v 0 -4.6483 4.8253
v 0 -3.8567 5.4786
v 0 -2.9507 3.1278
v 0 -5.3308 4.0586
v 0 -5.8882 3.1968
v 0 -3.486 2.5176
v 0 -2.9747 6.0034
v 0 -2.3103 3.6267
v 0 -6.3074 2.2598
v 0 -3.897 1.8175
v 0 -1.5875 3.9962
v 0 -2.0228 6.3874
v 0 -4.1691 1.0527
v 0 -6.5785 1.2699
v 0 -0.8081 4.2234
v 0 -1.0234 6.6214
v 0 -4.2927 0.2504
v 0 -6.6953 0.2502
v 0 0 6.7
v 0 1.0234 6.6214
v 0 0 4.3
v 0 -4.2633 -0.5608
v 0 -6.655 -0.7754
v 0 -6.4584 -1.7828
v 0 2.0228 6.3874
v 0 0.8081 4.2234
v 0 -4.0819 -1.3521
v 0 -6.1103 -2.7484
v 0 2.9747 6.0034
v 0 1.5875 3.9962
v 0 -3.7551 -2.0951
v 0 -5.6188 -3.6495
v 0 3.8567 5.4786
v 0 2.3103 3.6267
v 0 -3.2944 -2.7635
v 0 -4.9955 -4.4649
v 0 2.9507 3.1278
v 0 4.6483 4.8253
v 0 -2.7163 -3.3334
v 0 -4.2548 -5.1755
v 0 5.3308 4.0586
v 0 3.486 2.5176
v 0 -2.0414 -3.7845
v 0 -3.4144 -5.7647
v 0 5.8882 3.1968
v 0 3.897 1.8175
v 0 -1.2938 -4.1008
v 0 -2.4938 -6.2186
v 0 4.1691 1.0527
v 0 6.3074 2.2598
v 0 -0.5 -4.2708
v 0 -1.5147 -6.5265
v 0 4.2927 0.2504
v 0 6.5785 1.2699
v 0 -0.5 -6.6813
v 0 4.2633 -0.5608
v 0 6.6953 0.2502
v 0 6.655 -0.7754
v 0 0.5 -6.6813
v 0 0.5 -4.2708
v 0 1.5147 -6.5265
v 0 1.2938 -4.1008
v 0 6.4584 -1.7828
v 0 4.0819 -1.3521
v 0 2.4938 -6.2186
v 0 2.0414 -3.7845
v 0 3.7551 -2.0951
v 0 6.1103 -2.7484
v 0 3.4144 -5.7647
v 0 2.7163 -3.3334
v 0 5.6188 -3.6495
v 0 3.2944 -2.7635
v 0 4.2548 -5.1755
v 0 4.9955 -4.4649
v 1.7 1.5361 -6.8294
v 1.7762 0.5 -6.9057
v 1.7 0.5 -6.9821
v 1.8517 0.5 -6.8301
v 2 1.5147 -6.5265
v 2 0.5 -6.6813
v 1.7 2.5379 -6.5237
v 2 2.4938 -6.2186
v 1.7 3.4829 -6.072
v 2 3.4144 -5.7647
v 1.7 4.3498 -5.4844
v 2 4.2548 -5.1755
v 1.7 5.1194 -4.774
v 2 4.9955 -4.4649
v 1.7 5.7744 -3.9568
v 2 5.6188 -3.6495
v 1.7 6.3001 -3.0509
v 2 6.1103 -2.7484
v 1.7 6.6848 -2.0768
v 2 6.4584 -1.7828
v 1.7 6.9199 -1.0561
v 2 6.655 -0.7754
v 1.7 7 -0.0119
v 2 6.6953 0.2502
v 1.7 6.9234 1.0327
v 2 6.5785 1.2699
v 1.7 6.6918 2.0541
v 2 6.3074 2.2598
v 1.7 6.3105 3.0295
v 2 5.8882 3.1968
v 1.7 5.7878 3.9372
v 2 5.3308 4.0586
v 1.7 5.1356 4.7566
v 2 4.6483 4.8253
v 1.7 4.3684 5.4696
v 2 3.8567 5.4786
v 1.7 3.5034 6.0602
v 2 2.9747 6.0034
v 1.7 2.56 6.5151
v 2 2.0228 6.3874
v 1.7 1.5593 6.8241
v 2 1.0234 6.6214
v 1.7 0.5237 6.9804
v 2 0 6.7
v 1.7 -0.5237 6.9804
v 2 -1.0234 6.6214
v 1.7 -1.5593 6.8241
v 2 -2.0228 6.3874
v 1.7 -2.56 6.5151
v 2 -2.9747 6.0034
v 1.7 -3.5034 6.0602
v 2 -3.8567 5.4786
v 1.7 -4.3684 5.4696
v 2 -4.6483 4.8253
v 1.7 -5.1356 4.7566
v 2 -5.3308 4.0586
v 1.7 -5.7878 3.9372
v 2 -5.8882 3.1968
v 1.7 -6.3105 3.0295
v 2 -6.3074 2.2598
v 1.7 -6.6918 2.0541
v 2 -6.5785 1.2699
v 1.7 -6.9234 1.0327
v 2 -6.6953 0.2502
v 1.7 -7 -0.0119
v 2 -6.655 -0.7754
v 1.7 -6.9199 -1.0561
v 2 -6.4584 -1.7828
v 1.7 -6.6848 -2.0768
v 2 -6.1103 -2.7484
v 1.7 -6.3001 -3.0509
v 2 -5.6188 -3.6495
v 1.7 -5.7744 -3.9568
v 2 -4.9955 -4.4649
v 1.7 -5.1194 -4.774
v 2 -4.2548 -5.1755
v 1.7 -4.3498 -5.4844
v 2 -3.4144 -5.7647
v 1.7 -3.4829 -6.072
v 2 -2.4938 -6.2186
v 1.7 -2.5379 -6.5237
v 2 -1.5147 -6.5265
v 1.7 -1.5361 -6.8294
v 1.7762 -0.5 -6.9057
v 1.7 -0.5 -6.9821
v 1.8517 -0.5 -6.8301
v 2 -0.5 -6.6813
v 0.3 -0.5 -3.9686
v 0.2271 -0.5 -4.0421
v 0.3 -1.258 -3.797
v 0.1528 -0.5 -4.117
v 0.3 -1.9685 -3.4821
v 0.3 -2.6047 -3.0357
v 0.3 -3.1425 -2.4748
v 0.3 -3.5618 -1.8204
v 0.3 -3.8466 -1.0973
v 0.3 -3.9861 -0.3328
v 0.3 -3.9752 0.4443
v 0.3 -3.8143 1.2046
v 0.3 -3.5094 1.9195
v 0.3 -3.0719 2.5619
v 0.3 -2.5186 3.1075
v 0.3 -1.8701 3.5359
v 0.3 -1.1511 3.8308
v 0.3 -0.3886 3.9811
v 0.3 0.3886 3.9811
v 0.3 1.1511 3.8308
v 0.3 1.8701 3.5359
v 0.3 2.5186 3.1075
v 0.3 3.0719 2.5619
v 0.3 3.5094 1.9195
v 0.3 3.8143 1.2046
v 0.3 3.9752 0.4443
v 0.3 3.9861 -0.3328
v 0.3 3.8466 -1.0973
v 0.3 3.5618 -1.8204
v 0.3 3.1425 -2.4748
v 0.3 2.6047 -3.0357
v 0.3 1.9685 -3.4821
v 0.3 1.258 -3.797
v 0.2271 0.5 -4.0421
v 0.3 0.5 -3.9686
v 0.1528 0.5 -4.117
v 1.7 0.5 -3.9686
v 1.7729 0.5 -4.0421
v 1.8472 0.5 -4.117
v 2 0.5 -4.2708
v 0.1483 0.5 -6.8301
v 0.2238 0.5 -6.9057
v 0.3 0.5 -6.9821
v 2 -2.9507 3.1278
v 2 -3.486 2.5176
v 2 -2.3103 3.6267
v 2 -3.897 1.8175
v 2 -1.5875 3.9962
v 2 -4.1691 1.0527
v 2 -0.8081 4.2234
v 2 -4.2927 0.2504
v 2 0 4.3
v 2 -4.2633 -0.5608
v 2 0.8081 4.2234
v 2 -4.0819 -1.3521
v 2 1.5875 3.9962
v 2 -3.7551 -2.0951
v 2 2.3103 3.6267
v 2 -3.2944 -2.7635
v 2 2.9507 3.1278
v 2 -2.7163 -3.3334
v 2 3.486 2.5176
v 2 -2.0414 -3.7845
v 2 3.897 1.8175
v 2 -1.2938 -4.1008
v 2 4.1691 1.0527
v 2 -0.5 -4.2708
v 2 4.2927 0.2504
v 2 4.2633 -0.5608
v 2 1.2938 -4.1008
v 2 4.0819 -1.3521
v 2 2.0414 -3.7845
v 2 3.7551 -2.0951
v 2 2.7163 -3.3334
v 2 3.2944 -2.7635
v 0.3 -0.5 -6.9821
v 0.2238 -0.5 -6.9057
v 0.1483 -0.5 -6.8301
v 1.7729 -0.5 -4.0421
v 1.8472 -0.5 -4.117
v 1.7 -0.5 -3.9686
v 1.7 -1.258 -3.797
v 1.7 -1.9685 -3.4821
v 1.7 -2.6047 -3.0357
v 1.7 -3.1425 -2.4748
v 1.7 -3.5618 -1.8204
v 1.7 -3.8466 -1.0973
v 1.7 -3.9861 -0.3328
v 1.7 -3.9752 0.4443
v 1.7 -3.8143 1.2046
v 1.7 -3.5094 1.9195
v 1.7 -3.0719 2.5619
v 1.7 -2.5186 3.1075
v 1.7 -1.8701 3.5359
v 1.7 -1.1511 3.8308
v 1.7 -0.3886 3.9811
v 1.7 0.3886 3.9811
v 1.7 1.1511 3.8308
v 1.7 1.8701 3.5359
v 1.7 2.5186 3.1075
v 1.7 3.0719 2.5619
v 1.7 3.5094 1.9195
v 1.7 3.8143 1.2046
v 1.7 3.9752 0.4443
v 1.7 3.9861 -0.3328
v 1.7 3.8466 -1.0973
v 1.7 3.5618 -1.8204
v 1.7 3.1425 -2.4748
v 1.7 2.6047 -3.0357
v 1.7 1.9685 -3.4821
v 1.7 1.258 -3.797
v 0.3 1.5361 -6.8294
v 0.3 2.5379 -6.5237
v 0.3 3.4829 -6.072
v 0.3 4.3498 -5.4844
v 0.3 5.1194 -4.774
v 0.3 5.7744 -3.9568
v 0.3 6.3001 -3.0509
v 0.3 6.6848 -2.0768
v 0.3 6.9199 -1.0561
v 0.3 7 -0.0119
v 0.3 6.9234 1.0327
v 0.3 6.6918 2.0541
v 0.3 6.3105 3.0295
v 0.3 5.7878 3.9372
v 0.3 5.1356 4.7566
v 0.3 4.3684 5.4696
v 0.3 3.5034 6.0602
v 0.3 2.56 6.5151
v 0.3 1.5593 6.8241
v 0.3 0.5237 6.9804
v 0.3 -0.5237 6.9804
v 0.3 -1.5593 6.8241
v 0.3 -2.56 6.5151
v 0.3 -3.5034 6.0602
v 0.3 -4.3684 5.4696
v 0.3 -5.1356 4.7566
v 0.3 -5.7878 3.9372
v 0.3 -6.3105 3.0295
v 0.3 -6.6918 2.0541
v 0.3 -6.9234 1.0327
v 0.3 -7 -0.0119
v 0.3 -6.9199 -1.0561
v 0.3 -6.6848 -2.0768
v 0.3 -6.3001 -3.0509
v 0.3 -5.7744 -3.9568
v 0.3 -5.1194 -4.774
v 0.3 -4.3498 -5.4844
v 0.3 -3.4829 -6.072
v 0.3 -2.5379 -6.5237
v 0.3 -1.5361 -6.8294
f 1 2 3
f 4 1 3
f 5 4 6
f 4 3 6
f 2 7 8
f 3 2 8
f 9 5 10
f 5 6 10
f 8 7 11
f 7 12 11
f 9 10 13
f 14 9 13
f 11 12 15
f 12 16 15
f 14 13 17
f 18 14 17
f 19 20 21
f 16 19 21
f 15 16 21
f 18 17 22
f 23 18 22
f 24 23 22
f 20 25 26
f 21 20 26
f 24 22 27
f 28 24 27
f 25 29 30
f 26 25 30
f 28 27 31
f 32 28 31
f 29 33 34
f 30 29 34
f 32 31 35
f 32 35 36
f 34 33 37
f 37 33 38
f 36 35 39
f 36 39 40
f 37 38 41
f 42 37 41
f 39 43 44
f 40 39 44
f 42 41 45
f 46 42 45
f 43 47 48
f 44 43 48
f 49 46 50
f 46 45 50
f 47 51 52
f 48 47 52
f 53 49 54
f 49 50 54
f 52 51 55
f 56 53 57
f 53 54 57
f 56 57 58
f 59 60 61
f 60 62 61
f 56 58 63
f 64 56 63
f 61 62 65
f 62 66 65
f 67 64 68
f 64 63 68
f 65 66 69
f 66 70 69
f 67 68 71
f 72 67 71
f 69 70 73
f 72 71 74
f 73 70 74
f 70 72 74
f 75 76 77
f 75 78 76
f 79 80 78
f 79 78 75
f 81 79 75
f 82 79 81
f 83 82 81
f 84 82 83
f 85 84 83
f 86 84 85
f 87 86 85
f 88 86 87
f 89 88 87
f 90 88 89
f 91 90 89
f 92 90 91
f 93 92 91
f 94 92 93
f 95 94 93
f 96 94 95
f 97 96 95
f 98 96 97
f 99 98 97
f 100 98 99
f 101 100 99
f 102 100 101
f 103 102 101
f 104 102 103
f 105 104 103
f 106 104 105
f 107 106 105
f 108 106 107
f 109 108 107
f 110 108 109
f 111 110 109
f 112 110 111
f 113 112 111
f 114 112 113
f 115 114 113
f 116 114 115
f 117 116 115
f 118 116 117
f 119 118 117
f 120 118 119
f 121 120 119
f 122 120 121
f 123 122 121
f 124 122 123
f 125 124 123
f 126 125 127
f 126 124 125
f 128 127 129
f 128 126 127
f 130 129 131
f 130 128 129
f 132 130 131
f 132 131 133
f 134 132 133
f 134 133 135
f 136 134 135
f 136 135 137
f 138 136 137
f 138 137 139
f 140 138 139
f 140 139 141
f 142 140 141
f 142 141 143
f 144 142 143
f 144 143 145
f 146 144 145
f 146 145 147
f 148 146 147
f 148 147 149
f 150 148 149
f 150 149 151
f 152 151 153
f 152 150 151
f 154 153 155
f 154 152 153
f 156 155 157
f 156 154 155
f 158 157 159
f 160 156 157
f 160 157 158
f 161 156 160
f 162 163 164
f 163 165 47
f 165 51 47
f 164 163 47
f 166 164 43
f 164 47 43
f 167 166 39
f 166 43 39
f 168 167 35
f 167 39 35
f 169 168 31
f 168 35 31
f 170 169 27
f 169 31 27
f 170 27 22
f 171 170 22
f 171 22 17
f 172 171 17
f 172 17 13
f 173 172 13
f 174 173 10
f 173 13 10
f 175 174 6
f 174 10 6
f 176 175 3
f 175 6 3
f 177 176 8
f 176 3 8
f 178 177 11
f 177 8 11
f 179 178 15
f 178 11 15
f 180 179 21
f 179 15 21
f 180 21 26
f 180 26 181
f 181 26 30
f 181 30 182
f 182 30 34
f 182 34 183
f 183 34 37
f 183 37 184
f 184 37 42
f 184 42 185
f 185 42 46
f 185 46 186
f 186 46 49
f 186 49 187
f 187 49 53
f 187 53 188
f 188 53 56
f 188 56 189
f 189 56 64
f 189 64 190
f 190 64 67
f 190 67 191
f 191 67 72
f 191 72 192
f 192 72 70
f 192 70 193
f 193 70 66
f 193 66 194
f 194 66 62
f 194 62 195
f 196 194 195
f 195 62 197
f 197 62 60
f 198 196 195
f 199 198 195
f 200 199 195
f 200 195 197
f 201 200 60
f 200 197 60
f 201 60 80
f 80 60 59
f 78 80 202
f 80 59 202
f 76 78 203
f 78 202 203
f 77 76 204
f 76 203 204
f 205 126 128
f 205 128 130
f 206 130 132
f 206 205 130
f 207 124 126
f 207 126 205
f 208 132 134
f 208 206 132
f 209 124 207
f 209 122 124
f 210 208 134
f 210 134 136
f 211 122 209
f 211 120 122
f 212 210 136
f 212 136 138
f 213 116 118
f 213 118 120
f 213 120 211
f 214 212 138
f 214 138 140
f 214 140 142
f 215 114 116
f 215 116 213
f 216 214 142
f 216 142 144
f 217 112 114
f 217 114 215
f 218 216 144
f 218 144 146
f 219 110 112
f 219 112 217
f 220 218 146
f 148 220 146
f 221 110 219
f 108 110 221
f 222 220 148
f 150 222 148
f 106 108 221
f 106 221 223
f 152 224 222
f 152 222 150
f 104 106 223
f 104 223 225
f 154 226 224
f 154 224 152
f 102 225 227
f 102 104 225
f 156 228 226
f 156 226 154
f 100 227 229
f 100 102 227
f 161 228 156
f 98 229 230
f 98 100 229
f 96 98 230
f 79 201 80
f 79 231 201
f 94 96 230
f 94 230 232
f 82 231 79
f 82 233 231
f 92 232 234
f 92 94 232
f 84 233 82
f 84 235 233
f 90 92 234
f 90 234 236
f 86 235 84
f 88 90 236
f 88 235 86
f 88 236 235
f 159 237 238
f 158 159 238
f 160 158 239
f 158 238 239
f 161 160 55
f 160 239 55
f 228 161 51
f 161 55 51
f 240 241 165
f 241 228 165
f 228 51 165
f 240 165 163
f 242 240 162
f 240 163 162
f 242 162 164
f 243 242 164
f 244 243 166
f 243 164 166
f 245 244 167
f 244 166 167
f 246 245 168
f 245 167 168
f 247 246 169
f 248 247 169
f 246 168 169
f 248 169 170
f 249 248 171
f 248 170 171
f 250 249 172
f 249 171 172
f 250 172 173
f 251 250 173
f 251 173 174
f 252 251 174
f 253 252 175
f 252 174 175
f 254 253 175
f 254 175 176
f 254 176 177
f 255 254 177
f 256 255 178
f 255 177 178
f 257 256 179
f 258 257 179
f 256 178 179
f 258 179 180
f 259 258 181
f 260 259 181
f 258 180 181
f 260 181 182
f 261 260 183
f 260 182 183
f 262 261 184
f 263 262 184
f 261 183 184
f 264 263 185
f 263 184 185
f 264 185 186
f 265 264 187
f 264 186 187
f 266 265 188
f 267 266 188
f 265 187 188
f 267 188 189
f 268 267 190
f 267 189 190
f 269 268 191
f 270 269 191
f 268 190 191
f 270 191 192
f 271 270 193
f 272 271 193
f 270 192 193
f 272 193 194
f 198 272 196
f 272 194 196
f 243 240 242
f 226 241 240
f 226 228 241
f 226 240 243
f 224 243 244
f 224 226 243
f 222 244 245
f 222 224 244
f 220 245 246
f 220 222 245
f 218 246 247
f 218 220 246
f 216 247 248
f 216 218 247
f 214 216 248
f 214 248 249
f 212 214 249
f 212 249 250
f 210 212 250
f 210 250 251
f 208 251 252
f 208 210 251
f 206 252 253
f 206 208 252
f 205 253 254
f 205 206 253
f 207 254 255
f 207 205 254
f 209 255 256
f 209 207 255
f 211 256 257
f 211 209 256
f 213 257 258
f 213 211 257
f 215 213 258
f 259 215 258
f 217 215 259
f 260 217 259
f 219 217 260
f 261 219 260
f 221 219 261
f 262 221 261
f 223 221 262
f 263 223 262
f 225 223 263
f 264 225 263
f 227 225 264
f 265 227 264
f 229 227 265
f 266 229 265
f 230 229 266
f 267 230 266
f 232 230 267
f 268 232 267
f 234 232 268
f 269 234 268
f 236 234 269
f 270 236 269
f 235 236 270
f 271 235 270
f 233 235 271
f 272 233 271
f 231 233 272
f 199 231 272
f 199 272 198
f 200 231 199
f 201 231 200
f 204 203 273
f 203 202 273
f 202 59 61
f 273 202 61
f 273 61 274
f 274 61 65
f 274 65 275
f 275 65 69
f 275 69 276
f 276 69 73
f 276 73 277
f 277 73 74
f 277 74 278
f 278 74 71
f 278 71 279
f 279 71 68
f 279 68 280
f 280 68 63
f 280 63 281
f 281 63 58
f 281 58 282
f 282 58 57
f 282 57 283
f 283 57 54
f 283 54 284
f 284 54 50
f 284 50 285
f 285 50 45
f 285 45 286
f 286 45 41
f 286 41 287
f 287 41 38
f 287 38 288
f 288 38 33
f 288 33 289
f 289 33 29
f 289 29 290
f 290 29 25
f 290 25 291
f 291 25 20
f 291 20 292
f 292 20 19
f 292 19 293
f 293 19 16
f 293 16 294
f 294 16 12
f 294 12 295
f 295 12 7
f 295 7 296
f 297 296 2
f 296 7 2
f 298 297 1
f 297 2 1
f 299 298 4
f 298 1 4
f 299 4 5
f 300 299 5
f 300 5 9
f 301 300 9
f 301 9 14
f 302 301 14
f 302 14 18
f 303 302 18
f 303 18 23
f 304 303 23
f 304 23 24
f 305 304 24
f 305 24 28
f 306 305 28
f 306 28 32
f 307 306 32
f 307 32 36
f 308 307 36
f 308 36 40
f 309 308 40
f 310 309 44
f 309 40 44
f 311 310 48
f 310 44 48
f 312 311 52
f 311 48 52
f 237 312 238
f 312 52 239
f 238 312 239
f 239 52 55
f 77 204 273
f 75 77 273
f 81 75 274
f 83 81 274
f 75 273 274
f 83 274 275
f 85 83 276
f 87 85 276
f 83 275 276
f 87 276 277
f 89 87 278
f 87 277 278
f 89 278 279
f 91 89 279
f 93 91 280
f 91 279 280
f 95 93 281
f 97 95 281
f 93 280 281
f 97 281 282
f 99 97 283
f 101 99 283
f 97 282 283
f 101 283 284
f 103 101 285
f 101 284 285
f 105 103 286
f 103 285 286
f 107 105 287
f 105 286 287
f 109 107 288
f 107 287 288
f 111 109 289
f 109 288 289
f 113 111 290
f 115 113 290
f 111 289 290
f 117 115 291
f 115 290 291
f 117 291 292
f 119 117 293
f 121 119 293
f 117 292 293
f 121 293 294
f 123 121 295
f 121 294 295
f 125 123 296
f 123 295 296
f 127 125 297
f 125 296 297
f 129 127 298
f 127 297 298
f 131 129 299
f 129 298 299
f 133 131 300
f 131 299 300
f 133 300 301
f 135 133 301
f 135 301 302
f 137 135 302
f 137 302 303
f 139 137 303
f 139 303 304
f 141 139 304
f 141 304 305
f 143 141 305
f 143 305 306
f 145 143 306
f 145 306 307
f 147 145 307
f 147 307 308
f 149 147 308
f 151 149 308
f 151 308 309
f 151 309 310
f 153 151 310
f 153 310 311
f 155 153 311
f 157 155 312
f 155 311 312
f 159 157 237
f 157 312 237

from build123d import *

# Parameters (mm, degrees)
BOSS_EXTRUDE1_DEPTH = 2
CHAMFER1_SIZE       = 0.3


with BuildPart() as part:
    # Sketch1 → Boss-Extrude1 (new body)
    with BuildSketch(Plane(origin=(0, 0, 0), x_dir=(0, 0, -1), z_dir=(1, 0, 0))):
        with BuildLine():
            Line((3.968626967, 0.5), (6.982120022, 0.5))
            ThreePointArc((6.982120022, 0.5), (-7, 0), (6.982120022, -0.5))
            Line((6.982120022, -0.5), (3.968626967, -0.5))
            ThreePointArc((3.968626967, -0.5), (-4, 0), (3.968626967, 0.5))
        make_face()
    extrude(amount=BOSS_EXTRUDE1_DEPTH)

    # Chamfer1
    chamfer1_edges = [part.edges().sort_by_distance(p)[0] for p in [
        (2, 0, 4),
        (2, 0, 7),
        (0, 0, 4),
        (0, 0, 7),
    ]]
    chamfer(chamfer1_edges, length=CHAMFER1_SIZE)


solid = part.part
